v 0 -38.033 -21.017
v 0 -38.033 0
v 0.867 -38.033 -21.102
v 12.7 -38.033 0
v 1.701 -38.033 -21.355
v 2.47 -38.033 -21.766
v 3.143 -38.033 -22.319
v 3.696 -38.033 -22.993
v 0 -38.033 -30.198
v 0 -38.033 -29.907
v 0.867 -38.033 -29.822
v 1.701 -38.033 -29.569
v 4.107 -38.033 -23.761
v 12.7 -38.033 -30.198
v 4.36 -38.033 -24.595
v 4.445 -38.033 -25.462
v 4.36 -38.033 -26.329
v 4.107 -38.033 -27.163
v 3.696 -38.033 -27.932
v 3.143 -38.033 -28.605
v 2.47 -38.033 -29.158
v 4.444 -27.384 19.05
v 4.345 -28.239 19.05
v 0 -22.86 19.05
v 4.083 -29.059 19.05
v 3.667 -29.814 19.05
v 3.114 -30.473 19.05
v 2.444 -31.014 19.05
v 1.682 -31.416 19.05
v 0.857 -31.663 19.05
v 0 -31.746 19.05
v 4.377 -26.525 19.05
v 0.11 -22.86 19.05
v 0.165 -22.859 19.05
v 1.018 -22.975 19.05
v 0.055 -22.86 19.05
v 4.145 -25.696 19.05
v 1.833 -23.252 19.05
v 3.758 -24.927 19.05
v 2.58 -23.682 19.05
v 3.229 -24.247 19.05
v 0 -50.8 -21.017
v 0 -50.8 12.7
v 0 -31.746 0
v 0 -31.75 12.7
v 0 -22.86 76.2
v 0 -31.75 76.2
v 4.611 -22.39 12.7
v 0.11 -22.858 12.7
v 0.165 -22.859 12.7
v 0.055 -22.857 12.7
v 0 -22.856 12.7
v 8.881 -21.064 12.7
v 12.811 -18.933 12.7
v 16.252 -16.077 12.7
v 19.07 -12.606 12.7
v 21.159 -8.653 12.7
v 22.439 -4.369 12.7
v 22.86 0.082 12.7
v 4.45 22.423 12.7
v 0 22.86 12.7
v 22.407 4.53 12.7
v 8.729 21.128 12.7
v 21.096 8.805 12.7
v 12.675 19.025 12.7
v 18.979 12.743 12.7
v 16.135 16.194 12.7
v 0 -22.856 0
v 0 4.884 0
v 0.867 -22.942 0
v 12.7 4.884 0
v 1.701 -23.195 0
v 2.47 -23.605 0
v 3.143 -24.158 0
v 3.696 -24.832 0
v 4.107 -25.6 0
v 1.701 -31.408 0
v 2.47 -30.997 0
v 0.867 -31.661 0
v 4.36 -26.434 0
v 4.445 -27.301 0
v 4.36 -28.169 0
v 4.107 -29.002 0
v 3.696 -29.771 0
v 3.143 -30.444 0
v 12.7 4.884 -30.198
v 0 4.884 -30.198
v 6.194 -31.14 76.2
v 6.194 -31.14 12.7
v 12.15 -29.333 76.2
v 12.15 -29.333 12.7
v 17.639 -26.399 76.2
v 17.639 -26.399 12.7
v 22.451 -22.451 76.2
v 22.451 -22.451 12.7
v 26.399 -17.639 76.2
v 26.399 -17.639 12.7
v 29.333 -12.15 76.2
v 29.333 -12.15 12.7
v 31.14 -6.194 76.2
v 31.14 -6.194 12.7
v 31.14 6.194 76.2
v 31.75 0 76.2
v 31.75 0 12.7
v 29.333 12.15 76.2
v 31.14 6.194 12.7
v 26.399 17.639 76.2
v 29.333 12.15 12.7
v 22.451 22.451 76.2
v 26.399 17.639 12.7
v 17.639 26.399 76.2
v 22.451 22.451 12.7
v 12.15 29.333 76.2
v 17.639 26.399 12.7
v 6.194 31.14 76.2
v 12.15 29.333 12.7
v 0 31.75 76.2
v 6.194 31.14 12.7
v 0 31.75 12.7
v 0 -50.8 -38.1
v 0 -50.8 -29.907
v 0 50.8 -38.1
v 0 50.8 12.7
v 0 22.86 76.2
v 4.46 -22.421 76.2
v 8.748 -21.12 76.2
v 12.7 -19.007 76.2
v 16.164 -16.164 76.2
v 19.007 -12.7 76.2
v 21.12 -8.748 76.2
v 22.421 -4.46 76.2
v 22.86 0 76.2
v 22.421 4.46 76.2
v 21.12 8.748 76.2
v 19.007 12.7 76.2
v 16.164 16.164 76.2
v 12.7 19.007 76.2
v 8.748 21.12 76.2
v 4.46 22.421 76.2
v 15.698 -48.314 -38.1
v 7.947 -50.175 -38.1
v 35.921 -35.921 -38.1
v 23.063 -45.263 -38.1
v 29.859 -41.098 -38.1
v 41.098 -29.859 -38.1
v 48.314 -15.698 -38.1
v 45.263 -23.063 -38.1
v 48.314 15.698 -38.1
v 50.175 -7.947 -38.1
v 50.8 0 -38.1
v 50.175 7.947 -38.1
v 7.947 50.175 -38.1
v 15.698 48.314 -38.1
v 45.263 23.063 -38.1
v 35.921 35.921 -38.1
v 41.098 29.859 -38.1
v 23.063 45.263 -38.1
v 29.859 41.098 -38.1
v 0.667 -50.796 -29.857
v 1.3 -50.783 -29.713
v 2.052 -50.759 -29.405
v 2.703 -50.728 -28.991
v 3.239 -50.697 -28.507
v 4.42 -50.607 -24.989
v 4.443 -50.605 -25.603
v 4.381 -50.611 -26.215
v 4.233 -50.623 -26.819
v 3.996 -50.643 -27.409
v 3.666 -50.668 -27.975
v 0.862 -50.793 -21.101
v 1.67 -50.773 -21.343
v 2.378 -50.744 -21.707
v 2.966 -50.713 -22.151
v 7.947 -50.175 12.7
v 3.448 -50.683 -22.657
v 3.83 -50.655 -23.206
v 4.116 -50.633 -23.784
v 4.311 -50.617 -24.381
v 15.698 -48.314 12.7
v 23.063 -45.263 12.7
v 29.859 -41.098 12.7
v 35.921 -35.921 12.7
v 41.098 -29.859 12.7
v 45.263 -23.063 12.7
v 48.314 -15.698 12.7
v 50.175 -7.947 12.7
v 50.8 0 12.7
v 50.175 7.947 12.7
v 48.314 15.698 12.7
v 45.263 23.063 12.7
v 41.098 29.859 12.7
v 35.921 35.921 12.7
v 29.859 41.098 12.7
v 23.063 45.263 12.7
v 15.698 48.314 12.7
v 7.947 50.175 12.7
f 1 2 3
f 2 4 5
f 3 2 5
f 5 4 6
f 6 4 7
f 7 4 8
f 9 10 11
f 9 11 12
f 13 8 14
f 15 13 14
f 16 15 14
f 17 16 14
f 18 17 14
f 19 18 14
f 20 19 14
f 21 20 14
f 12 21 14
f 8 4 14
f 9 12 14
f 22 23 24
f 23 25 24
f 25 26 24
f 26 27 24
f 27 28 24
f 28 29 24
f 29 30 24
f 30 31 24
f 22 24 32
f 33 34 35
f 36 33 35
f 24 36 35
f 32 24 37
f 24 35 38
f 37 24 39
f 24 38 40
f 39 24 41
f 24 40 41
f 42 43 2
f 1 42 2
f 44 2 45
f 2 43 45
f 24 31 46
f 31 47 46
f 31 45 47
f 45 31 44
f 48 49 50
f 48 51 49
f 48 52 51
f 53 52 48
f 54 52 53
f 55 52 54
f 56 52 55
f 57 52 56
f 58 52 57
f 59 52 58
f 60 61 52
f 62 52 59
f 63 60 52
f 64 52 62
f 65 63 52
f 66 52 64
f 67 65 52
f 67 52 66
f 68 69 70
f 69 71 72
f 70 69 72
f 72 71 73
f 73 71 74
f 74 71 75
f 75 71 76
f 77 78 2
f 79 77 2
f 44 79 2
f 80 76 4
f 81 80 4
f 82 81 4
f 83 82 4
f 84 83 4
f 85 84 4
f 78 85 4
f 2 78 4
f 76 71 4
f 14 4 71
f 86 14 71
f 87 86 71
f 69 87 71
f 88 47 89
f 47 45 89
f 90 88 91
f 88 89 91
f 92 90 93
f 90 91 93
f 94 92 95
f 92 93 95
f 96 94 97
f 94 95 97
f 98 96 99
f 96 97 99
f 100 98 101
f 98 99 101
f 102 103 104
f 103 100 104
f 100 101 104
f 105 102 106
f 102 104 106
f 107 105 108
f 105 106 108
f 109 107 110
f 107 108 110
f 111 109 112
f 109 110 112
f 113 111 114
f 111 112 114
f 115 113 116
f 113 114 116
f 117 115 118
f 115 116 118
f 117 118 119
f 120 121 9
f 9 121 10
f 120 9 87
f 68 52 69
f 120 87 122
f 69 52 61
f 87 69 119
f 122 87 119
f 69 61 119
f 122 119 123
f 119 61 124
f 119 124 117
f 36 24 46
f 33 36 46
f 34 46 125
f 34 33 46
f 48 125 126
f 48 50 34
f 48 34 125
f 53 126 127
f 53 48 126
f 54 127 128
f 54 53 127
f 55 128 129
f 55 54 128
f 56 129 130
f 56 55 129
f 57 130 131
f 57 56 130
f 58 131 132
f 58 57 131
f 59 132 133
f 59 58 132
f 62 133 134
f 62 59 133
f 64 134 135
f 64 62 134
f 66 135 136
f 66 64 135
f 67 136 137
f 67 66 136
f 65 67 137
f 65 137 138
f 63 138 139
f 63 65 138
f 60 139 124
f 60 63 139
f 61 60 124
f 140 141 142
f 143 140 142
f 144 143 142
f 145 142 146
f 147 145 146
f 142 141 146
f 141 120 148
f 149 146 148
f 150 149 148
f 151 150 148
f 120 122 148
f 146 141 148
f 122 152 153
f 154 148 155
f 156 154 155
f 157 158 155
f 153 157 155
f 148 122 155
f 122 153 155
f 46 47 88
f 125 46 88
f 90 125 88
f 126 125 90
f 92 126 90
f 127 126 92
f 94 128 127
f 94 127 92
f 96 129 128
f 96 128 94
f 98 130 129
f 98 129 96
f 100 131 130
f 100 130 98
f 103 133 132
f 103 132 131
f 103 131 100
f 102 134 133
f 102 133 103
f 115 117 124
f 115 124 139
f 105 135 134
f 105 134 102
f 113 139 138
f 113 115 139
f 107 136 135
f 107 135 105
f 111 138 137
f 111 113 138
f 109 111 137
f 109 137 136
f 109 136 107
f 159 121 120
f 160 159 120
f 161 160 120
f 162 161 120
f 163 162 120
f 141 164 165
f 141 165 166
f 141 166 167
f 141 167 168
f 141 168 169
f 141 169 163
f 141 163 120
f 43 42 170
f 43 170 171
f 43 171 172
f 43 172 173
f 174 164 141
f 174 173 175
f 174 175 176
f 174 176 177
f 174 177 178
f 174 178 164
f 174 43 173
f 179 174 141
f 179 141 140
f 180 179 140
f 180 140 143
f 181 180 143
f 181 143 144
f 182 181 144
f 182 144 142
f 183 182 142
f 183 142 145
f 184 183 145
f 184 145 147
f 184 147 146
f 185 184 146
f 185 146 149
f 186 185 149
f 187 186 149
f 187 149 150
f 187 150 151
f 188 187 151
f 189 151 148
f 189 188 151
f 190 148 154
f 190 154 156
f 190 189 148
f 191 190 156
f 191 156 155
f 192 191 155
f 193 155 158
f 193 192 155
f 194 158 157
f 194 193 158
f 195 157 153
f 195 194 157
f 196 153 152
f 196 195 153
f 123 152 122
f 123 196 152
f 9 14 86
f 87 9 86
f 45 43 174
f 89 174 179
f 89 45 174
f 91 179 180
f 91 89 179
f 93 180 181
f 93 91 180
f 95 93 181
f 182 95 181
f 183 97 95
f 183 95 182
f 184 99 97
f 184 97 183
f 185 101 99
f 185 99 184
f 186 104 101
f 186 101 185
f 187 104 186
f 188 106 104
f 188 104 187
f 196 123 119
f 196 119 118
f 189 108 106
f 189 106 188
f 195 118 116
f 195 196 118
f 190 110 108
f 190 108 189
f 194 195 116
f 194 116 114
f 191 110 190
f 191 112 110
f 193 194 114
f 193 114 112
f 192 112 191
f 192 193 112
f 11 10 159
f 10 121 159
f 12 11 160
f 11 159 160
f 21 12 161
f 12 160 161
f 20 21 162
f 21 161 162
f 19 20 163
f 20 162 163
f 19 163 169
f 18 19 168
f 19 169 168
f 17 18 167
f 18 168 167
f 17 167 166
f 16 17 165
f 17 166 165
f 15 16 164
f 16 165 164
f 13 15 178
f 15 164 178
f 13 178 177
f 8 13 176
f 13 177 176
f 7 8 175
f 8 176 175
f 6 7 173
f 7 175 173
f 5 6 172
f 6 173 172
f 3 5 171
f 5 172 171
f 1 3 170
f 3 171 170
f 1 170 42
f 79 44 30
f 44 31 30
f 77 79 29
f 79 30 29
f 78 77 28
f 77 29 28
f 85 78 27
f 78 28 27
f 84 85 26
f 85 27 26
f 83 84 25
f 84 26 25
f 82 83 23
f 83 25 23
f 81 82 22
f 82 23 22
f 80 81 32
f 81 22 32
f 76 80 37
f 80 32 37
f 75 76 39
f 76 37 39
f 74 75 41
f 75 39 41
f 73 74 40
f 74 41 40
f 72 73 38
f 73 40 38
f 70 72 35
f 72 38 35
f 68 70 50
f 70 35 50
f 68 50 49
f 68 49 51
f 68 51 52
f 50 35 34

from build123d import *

# Parameters (mm, degrees)
F1_R      = 50.8
F2_DEPTH  = 50.8
F4_R      = 4.445
F5_DEPTH  = 15.24
F6_DEPTH  = 12.7
F8_DEPTH  = 12.7
F9_DEPTH  = 25.4
F10_R     = 31.75
F10_R_2   = 22.86
F11_DEPTH = 63.5
F13_W     = 63.243523
F13_H     = 123.192005
F14_DEPTH = 127
F16_R     = 4.445
F17_DEPTH = 25.4


with BuildPart() as f2:
    # F1 (on offset) → F2 (new body)
    with BuildSketch(Plane.XY.offset(12.7)):
        Circle(F1_R)
    extrude(amount=-F2_DEPTH)

    # F4 (on offset) → F5 (cut)
    with BuildSketch(Plane.XZ.offset(50.8)):
        with Locations((0, -25.462054)):
            Circle(F4_R)
    extrude(amount=-F5_DEPTH, mode=Mode.SUBTRACT)

    # F4 (on offset) → F6 (cut)
    with BuildSketch(Plane.XZ.offset(50.8)):
        with Locations((0, -25.462054)):
            Circle(F4_R)
    extrude(amount=-F6_DEPTH, mode=Mode.SUBTRACT)

    # F7 (on Right) → F8 (cut)
    with BuildSketch(Plane.YZ):
        Polygon((4.88417, -30.198015), (4.88417, 0), (-4.341668, 0), (-38.032606, 0), (-38.032606, -30.198015), align=None)
    extrude(amount=F8_DEPTH, mode=Mode.SUBTRACT)

    # F7 (on Right) → F9 (cut)
    with BuildSketch(Plane.YZ):
        Polygon((4.88417, -30.198015), (4.88417, 0), (-4.341668, 0), (-38.032606, 0), (-38.032606, -30.198015), align=None)
    extrude(amount=-F9_DEPTH, mode=Mode.SUBTRACT)

    # F10 (on offset) → F11 (join)
    with BuildSketch(Plane.XY.offset(12.7)):
        Circle(F10_R)
        Circle(F10_R_2, mode=Mode.SUBTRACT)
    extrude(amount=F11_DEPTH)

    # F13 (on offset) → F14 (cut)
    with BuildSketch(Plane.XY.offset(76.2)):
        with Locations((-31.621761, -5.643372)):
            Rectangle(F13_W, F13_H)
    extrude(amount=-F14_DEPTH, mode=Mode.SUBTRACT)

    # F16 (on offset) → F17 (cut)
    with BuildSketch(Plane.XY.offset(19.05)):
        with Locations((0, -27.301347)):
            Circle(F16_R)
    extrude(amount=-F17_DEPTH, mode=Mode.SUBTRACT)


solid = f2.part
